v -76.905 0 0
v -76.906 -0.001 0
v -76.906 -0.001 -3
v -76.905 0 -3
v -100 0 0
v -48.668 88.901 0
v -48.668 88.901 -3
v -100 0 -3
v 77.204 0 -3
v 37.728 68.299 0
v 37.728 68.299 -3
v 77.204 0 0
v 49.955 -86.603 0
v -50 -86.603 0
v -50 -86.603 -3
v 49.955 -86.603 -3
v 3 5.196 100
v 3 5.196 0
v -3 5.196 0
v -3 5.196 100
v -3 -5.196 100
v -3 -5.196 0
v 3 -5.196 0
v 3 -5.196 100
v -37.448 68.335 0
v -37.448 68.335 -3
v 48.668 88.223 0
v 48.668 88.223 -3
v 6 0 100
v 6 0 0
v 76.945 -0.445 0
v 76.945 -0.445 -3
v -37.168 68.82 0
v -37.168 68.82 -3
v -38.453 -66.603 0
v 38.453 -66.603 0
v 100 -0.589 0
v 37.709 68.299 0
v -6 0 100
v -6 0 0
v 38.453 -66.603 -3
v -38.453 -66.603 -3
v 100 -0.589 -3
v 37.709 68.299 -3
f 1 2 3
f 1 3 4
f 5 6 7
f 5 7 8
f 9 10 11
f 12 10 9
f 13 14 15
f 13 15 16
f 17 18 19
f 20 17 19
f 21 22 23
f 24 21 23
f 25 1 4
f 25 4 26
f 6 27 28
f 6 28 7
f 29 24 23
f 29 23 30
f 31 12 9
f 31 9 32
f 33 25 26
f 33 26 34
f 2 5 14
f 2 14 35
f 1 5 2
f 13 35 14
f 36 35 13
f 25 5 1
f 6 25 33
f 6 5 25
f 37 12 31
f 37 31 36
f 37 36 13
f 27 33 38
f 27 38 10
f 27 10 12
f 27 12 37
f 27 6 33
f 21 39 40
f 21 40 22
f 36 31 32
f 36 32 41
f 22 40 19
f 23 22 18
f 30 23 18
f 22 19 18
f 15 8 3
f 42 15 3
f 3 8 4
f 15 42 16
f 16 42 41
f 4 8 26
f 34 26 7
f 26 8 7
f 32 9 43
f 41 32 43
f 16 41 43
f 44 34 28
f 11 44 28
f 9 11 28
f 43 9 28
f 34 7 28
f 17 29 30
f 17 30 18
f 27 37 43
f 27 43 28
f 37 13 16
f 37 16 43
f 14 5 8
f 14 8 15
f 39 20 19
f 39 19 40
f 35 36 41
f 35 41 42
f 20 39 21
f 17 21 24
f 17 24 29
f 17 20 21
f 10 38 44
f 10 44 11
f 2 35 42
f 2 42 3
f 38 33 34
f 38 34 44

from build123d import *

# Parameters (mm, degrees)
F1_DEPTH = 100
F2_DEPTH = 3


with BuildPart() as f1:
    # F0 (on Top) → F1 (new body)
    with BuildSketch(Plane.XY):
        Polygon((3, 5.196152), (-3, 5.196152), (-6, 0), (-3, -5.196152), (3, -5.196152), (6, 0), align=None)
    extrude(amount=F1_DEPTH)


with BuildPart() as f2:
    # F0 (on Top) → F2 (new body)
    with BuildSketch(Plane.XY):
        Polygon((-37.447739, 68.335361), (-48.66778, 88.900557), (-100, 0), (-76.905375, 0), align=None)
        Polygon((48.66778, 88.222913), (-48.66778, 88.900557), (-37.447739, 68.335361), (-37.167897, 68.82001), (37.708741, 68.298724), align=None)
        Polygon((100, -0.589291), (48.66778, 88.222913), (37.708741, 68.298724), (37.728347, 68.298587), (77.203982, 0), (76.94521, -0.444759), align=None)
        Polygon((-76.905375, 0), (-100, 0), (-50, -86.60254), (-38.452995, -66.60254), (-76.905682, -0.000532), align=None)
        Polygon((49.955388, -86.60254), (100, -0.589291), (76.94521, -0.444759), (38.452995, -66.60254), (38.419343, -66.60254), align=None)
        Polygon((-38.452995, -66.60254), (-50, -86.60254), (49.955388, -86.60254), (38.419343, -66.60254), align=None)
    extrude(amount=-F2_DEPTH)


solid = Compound([f1.part, f2.part])
